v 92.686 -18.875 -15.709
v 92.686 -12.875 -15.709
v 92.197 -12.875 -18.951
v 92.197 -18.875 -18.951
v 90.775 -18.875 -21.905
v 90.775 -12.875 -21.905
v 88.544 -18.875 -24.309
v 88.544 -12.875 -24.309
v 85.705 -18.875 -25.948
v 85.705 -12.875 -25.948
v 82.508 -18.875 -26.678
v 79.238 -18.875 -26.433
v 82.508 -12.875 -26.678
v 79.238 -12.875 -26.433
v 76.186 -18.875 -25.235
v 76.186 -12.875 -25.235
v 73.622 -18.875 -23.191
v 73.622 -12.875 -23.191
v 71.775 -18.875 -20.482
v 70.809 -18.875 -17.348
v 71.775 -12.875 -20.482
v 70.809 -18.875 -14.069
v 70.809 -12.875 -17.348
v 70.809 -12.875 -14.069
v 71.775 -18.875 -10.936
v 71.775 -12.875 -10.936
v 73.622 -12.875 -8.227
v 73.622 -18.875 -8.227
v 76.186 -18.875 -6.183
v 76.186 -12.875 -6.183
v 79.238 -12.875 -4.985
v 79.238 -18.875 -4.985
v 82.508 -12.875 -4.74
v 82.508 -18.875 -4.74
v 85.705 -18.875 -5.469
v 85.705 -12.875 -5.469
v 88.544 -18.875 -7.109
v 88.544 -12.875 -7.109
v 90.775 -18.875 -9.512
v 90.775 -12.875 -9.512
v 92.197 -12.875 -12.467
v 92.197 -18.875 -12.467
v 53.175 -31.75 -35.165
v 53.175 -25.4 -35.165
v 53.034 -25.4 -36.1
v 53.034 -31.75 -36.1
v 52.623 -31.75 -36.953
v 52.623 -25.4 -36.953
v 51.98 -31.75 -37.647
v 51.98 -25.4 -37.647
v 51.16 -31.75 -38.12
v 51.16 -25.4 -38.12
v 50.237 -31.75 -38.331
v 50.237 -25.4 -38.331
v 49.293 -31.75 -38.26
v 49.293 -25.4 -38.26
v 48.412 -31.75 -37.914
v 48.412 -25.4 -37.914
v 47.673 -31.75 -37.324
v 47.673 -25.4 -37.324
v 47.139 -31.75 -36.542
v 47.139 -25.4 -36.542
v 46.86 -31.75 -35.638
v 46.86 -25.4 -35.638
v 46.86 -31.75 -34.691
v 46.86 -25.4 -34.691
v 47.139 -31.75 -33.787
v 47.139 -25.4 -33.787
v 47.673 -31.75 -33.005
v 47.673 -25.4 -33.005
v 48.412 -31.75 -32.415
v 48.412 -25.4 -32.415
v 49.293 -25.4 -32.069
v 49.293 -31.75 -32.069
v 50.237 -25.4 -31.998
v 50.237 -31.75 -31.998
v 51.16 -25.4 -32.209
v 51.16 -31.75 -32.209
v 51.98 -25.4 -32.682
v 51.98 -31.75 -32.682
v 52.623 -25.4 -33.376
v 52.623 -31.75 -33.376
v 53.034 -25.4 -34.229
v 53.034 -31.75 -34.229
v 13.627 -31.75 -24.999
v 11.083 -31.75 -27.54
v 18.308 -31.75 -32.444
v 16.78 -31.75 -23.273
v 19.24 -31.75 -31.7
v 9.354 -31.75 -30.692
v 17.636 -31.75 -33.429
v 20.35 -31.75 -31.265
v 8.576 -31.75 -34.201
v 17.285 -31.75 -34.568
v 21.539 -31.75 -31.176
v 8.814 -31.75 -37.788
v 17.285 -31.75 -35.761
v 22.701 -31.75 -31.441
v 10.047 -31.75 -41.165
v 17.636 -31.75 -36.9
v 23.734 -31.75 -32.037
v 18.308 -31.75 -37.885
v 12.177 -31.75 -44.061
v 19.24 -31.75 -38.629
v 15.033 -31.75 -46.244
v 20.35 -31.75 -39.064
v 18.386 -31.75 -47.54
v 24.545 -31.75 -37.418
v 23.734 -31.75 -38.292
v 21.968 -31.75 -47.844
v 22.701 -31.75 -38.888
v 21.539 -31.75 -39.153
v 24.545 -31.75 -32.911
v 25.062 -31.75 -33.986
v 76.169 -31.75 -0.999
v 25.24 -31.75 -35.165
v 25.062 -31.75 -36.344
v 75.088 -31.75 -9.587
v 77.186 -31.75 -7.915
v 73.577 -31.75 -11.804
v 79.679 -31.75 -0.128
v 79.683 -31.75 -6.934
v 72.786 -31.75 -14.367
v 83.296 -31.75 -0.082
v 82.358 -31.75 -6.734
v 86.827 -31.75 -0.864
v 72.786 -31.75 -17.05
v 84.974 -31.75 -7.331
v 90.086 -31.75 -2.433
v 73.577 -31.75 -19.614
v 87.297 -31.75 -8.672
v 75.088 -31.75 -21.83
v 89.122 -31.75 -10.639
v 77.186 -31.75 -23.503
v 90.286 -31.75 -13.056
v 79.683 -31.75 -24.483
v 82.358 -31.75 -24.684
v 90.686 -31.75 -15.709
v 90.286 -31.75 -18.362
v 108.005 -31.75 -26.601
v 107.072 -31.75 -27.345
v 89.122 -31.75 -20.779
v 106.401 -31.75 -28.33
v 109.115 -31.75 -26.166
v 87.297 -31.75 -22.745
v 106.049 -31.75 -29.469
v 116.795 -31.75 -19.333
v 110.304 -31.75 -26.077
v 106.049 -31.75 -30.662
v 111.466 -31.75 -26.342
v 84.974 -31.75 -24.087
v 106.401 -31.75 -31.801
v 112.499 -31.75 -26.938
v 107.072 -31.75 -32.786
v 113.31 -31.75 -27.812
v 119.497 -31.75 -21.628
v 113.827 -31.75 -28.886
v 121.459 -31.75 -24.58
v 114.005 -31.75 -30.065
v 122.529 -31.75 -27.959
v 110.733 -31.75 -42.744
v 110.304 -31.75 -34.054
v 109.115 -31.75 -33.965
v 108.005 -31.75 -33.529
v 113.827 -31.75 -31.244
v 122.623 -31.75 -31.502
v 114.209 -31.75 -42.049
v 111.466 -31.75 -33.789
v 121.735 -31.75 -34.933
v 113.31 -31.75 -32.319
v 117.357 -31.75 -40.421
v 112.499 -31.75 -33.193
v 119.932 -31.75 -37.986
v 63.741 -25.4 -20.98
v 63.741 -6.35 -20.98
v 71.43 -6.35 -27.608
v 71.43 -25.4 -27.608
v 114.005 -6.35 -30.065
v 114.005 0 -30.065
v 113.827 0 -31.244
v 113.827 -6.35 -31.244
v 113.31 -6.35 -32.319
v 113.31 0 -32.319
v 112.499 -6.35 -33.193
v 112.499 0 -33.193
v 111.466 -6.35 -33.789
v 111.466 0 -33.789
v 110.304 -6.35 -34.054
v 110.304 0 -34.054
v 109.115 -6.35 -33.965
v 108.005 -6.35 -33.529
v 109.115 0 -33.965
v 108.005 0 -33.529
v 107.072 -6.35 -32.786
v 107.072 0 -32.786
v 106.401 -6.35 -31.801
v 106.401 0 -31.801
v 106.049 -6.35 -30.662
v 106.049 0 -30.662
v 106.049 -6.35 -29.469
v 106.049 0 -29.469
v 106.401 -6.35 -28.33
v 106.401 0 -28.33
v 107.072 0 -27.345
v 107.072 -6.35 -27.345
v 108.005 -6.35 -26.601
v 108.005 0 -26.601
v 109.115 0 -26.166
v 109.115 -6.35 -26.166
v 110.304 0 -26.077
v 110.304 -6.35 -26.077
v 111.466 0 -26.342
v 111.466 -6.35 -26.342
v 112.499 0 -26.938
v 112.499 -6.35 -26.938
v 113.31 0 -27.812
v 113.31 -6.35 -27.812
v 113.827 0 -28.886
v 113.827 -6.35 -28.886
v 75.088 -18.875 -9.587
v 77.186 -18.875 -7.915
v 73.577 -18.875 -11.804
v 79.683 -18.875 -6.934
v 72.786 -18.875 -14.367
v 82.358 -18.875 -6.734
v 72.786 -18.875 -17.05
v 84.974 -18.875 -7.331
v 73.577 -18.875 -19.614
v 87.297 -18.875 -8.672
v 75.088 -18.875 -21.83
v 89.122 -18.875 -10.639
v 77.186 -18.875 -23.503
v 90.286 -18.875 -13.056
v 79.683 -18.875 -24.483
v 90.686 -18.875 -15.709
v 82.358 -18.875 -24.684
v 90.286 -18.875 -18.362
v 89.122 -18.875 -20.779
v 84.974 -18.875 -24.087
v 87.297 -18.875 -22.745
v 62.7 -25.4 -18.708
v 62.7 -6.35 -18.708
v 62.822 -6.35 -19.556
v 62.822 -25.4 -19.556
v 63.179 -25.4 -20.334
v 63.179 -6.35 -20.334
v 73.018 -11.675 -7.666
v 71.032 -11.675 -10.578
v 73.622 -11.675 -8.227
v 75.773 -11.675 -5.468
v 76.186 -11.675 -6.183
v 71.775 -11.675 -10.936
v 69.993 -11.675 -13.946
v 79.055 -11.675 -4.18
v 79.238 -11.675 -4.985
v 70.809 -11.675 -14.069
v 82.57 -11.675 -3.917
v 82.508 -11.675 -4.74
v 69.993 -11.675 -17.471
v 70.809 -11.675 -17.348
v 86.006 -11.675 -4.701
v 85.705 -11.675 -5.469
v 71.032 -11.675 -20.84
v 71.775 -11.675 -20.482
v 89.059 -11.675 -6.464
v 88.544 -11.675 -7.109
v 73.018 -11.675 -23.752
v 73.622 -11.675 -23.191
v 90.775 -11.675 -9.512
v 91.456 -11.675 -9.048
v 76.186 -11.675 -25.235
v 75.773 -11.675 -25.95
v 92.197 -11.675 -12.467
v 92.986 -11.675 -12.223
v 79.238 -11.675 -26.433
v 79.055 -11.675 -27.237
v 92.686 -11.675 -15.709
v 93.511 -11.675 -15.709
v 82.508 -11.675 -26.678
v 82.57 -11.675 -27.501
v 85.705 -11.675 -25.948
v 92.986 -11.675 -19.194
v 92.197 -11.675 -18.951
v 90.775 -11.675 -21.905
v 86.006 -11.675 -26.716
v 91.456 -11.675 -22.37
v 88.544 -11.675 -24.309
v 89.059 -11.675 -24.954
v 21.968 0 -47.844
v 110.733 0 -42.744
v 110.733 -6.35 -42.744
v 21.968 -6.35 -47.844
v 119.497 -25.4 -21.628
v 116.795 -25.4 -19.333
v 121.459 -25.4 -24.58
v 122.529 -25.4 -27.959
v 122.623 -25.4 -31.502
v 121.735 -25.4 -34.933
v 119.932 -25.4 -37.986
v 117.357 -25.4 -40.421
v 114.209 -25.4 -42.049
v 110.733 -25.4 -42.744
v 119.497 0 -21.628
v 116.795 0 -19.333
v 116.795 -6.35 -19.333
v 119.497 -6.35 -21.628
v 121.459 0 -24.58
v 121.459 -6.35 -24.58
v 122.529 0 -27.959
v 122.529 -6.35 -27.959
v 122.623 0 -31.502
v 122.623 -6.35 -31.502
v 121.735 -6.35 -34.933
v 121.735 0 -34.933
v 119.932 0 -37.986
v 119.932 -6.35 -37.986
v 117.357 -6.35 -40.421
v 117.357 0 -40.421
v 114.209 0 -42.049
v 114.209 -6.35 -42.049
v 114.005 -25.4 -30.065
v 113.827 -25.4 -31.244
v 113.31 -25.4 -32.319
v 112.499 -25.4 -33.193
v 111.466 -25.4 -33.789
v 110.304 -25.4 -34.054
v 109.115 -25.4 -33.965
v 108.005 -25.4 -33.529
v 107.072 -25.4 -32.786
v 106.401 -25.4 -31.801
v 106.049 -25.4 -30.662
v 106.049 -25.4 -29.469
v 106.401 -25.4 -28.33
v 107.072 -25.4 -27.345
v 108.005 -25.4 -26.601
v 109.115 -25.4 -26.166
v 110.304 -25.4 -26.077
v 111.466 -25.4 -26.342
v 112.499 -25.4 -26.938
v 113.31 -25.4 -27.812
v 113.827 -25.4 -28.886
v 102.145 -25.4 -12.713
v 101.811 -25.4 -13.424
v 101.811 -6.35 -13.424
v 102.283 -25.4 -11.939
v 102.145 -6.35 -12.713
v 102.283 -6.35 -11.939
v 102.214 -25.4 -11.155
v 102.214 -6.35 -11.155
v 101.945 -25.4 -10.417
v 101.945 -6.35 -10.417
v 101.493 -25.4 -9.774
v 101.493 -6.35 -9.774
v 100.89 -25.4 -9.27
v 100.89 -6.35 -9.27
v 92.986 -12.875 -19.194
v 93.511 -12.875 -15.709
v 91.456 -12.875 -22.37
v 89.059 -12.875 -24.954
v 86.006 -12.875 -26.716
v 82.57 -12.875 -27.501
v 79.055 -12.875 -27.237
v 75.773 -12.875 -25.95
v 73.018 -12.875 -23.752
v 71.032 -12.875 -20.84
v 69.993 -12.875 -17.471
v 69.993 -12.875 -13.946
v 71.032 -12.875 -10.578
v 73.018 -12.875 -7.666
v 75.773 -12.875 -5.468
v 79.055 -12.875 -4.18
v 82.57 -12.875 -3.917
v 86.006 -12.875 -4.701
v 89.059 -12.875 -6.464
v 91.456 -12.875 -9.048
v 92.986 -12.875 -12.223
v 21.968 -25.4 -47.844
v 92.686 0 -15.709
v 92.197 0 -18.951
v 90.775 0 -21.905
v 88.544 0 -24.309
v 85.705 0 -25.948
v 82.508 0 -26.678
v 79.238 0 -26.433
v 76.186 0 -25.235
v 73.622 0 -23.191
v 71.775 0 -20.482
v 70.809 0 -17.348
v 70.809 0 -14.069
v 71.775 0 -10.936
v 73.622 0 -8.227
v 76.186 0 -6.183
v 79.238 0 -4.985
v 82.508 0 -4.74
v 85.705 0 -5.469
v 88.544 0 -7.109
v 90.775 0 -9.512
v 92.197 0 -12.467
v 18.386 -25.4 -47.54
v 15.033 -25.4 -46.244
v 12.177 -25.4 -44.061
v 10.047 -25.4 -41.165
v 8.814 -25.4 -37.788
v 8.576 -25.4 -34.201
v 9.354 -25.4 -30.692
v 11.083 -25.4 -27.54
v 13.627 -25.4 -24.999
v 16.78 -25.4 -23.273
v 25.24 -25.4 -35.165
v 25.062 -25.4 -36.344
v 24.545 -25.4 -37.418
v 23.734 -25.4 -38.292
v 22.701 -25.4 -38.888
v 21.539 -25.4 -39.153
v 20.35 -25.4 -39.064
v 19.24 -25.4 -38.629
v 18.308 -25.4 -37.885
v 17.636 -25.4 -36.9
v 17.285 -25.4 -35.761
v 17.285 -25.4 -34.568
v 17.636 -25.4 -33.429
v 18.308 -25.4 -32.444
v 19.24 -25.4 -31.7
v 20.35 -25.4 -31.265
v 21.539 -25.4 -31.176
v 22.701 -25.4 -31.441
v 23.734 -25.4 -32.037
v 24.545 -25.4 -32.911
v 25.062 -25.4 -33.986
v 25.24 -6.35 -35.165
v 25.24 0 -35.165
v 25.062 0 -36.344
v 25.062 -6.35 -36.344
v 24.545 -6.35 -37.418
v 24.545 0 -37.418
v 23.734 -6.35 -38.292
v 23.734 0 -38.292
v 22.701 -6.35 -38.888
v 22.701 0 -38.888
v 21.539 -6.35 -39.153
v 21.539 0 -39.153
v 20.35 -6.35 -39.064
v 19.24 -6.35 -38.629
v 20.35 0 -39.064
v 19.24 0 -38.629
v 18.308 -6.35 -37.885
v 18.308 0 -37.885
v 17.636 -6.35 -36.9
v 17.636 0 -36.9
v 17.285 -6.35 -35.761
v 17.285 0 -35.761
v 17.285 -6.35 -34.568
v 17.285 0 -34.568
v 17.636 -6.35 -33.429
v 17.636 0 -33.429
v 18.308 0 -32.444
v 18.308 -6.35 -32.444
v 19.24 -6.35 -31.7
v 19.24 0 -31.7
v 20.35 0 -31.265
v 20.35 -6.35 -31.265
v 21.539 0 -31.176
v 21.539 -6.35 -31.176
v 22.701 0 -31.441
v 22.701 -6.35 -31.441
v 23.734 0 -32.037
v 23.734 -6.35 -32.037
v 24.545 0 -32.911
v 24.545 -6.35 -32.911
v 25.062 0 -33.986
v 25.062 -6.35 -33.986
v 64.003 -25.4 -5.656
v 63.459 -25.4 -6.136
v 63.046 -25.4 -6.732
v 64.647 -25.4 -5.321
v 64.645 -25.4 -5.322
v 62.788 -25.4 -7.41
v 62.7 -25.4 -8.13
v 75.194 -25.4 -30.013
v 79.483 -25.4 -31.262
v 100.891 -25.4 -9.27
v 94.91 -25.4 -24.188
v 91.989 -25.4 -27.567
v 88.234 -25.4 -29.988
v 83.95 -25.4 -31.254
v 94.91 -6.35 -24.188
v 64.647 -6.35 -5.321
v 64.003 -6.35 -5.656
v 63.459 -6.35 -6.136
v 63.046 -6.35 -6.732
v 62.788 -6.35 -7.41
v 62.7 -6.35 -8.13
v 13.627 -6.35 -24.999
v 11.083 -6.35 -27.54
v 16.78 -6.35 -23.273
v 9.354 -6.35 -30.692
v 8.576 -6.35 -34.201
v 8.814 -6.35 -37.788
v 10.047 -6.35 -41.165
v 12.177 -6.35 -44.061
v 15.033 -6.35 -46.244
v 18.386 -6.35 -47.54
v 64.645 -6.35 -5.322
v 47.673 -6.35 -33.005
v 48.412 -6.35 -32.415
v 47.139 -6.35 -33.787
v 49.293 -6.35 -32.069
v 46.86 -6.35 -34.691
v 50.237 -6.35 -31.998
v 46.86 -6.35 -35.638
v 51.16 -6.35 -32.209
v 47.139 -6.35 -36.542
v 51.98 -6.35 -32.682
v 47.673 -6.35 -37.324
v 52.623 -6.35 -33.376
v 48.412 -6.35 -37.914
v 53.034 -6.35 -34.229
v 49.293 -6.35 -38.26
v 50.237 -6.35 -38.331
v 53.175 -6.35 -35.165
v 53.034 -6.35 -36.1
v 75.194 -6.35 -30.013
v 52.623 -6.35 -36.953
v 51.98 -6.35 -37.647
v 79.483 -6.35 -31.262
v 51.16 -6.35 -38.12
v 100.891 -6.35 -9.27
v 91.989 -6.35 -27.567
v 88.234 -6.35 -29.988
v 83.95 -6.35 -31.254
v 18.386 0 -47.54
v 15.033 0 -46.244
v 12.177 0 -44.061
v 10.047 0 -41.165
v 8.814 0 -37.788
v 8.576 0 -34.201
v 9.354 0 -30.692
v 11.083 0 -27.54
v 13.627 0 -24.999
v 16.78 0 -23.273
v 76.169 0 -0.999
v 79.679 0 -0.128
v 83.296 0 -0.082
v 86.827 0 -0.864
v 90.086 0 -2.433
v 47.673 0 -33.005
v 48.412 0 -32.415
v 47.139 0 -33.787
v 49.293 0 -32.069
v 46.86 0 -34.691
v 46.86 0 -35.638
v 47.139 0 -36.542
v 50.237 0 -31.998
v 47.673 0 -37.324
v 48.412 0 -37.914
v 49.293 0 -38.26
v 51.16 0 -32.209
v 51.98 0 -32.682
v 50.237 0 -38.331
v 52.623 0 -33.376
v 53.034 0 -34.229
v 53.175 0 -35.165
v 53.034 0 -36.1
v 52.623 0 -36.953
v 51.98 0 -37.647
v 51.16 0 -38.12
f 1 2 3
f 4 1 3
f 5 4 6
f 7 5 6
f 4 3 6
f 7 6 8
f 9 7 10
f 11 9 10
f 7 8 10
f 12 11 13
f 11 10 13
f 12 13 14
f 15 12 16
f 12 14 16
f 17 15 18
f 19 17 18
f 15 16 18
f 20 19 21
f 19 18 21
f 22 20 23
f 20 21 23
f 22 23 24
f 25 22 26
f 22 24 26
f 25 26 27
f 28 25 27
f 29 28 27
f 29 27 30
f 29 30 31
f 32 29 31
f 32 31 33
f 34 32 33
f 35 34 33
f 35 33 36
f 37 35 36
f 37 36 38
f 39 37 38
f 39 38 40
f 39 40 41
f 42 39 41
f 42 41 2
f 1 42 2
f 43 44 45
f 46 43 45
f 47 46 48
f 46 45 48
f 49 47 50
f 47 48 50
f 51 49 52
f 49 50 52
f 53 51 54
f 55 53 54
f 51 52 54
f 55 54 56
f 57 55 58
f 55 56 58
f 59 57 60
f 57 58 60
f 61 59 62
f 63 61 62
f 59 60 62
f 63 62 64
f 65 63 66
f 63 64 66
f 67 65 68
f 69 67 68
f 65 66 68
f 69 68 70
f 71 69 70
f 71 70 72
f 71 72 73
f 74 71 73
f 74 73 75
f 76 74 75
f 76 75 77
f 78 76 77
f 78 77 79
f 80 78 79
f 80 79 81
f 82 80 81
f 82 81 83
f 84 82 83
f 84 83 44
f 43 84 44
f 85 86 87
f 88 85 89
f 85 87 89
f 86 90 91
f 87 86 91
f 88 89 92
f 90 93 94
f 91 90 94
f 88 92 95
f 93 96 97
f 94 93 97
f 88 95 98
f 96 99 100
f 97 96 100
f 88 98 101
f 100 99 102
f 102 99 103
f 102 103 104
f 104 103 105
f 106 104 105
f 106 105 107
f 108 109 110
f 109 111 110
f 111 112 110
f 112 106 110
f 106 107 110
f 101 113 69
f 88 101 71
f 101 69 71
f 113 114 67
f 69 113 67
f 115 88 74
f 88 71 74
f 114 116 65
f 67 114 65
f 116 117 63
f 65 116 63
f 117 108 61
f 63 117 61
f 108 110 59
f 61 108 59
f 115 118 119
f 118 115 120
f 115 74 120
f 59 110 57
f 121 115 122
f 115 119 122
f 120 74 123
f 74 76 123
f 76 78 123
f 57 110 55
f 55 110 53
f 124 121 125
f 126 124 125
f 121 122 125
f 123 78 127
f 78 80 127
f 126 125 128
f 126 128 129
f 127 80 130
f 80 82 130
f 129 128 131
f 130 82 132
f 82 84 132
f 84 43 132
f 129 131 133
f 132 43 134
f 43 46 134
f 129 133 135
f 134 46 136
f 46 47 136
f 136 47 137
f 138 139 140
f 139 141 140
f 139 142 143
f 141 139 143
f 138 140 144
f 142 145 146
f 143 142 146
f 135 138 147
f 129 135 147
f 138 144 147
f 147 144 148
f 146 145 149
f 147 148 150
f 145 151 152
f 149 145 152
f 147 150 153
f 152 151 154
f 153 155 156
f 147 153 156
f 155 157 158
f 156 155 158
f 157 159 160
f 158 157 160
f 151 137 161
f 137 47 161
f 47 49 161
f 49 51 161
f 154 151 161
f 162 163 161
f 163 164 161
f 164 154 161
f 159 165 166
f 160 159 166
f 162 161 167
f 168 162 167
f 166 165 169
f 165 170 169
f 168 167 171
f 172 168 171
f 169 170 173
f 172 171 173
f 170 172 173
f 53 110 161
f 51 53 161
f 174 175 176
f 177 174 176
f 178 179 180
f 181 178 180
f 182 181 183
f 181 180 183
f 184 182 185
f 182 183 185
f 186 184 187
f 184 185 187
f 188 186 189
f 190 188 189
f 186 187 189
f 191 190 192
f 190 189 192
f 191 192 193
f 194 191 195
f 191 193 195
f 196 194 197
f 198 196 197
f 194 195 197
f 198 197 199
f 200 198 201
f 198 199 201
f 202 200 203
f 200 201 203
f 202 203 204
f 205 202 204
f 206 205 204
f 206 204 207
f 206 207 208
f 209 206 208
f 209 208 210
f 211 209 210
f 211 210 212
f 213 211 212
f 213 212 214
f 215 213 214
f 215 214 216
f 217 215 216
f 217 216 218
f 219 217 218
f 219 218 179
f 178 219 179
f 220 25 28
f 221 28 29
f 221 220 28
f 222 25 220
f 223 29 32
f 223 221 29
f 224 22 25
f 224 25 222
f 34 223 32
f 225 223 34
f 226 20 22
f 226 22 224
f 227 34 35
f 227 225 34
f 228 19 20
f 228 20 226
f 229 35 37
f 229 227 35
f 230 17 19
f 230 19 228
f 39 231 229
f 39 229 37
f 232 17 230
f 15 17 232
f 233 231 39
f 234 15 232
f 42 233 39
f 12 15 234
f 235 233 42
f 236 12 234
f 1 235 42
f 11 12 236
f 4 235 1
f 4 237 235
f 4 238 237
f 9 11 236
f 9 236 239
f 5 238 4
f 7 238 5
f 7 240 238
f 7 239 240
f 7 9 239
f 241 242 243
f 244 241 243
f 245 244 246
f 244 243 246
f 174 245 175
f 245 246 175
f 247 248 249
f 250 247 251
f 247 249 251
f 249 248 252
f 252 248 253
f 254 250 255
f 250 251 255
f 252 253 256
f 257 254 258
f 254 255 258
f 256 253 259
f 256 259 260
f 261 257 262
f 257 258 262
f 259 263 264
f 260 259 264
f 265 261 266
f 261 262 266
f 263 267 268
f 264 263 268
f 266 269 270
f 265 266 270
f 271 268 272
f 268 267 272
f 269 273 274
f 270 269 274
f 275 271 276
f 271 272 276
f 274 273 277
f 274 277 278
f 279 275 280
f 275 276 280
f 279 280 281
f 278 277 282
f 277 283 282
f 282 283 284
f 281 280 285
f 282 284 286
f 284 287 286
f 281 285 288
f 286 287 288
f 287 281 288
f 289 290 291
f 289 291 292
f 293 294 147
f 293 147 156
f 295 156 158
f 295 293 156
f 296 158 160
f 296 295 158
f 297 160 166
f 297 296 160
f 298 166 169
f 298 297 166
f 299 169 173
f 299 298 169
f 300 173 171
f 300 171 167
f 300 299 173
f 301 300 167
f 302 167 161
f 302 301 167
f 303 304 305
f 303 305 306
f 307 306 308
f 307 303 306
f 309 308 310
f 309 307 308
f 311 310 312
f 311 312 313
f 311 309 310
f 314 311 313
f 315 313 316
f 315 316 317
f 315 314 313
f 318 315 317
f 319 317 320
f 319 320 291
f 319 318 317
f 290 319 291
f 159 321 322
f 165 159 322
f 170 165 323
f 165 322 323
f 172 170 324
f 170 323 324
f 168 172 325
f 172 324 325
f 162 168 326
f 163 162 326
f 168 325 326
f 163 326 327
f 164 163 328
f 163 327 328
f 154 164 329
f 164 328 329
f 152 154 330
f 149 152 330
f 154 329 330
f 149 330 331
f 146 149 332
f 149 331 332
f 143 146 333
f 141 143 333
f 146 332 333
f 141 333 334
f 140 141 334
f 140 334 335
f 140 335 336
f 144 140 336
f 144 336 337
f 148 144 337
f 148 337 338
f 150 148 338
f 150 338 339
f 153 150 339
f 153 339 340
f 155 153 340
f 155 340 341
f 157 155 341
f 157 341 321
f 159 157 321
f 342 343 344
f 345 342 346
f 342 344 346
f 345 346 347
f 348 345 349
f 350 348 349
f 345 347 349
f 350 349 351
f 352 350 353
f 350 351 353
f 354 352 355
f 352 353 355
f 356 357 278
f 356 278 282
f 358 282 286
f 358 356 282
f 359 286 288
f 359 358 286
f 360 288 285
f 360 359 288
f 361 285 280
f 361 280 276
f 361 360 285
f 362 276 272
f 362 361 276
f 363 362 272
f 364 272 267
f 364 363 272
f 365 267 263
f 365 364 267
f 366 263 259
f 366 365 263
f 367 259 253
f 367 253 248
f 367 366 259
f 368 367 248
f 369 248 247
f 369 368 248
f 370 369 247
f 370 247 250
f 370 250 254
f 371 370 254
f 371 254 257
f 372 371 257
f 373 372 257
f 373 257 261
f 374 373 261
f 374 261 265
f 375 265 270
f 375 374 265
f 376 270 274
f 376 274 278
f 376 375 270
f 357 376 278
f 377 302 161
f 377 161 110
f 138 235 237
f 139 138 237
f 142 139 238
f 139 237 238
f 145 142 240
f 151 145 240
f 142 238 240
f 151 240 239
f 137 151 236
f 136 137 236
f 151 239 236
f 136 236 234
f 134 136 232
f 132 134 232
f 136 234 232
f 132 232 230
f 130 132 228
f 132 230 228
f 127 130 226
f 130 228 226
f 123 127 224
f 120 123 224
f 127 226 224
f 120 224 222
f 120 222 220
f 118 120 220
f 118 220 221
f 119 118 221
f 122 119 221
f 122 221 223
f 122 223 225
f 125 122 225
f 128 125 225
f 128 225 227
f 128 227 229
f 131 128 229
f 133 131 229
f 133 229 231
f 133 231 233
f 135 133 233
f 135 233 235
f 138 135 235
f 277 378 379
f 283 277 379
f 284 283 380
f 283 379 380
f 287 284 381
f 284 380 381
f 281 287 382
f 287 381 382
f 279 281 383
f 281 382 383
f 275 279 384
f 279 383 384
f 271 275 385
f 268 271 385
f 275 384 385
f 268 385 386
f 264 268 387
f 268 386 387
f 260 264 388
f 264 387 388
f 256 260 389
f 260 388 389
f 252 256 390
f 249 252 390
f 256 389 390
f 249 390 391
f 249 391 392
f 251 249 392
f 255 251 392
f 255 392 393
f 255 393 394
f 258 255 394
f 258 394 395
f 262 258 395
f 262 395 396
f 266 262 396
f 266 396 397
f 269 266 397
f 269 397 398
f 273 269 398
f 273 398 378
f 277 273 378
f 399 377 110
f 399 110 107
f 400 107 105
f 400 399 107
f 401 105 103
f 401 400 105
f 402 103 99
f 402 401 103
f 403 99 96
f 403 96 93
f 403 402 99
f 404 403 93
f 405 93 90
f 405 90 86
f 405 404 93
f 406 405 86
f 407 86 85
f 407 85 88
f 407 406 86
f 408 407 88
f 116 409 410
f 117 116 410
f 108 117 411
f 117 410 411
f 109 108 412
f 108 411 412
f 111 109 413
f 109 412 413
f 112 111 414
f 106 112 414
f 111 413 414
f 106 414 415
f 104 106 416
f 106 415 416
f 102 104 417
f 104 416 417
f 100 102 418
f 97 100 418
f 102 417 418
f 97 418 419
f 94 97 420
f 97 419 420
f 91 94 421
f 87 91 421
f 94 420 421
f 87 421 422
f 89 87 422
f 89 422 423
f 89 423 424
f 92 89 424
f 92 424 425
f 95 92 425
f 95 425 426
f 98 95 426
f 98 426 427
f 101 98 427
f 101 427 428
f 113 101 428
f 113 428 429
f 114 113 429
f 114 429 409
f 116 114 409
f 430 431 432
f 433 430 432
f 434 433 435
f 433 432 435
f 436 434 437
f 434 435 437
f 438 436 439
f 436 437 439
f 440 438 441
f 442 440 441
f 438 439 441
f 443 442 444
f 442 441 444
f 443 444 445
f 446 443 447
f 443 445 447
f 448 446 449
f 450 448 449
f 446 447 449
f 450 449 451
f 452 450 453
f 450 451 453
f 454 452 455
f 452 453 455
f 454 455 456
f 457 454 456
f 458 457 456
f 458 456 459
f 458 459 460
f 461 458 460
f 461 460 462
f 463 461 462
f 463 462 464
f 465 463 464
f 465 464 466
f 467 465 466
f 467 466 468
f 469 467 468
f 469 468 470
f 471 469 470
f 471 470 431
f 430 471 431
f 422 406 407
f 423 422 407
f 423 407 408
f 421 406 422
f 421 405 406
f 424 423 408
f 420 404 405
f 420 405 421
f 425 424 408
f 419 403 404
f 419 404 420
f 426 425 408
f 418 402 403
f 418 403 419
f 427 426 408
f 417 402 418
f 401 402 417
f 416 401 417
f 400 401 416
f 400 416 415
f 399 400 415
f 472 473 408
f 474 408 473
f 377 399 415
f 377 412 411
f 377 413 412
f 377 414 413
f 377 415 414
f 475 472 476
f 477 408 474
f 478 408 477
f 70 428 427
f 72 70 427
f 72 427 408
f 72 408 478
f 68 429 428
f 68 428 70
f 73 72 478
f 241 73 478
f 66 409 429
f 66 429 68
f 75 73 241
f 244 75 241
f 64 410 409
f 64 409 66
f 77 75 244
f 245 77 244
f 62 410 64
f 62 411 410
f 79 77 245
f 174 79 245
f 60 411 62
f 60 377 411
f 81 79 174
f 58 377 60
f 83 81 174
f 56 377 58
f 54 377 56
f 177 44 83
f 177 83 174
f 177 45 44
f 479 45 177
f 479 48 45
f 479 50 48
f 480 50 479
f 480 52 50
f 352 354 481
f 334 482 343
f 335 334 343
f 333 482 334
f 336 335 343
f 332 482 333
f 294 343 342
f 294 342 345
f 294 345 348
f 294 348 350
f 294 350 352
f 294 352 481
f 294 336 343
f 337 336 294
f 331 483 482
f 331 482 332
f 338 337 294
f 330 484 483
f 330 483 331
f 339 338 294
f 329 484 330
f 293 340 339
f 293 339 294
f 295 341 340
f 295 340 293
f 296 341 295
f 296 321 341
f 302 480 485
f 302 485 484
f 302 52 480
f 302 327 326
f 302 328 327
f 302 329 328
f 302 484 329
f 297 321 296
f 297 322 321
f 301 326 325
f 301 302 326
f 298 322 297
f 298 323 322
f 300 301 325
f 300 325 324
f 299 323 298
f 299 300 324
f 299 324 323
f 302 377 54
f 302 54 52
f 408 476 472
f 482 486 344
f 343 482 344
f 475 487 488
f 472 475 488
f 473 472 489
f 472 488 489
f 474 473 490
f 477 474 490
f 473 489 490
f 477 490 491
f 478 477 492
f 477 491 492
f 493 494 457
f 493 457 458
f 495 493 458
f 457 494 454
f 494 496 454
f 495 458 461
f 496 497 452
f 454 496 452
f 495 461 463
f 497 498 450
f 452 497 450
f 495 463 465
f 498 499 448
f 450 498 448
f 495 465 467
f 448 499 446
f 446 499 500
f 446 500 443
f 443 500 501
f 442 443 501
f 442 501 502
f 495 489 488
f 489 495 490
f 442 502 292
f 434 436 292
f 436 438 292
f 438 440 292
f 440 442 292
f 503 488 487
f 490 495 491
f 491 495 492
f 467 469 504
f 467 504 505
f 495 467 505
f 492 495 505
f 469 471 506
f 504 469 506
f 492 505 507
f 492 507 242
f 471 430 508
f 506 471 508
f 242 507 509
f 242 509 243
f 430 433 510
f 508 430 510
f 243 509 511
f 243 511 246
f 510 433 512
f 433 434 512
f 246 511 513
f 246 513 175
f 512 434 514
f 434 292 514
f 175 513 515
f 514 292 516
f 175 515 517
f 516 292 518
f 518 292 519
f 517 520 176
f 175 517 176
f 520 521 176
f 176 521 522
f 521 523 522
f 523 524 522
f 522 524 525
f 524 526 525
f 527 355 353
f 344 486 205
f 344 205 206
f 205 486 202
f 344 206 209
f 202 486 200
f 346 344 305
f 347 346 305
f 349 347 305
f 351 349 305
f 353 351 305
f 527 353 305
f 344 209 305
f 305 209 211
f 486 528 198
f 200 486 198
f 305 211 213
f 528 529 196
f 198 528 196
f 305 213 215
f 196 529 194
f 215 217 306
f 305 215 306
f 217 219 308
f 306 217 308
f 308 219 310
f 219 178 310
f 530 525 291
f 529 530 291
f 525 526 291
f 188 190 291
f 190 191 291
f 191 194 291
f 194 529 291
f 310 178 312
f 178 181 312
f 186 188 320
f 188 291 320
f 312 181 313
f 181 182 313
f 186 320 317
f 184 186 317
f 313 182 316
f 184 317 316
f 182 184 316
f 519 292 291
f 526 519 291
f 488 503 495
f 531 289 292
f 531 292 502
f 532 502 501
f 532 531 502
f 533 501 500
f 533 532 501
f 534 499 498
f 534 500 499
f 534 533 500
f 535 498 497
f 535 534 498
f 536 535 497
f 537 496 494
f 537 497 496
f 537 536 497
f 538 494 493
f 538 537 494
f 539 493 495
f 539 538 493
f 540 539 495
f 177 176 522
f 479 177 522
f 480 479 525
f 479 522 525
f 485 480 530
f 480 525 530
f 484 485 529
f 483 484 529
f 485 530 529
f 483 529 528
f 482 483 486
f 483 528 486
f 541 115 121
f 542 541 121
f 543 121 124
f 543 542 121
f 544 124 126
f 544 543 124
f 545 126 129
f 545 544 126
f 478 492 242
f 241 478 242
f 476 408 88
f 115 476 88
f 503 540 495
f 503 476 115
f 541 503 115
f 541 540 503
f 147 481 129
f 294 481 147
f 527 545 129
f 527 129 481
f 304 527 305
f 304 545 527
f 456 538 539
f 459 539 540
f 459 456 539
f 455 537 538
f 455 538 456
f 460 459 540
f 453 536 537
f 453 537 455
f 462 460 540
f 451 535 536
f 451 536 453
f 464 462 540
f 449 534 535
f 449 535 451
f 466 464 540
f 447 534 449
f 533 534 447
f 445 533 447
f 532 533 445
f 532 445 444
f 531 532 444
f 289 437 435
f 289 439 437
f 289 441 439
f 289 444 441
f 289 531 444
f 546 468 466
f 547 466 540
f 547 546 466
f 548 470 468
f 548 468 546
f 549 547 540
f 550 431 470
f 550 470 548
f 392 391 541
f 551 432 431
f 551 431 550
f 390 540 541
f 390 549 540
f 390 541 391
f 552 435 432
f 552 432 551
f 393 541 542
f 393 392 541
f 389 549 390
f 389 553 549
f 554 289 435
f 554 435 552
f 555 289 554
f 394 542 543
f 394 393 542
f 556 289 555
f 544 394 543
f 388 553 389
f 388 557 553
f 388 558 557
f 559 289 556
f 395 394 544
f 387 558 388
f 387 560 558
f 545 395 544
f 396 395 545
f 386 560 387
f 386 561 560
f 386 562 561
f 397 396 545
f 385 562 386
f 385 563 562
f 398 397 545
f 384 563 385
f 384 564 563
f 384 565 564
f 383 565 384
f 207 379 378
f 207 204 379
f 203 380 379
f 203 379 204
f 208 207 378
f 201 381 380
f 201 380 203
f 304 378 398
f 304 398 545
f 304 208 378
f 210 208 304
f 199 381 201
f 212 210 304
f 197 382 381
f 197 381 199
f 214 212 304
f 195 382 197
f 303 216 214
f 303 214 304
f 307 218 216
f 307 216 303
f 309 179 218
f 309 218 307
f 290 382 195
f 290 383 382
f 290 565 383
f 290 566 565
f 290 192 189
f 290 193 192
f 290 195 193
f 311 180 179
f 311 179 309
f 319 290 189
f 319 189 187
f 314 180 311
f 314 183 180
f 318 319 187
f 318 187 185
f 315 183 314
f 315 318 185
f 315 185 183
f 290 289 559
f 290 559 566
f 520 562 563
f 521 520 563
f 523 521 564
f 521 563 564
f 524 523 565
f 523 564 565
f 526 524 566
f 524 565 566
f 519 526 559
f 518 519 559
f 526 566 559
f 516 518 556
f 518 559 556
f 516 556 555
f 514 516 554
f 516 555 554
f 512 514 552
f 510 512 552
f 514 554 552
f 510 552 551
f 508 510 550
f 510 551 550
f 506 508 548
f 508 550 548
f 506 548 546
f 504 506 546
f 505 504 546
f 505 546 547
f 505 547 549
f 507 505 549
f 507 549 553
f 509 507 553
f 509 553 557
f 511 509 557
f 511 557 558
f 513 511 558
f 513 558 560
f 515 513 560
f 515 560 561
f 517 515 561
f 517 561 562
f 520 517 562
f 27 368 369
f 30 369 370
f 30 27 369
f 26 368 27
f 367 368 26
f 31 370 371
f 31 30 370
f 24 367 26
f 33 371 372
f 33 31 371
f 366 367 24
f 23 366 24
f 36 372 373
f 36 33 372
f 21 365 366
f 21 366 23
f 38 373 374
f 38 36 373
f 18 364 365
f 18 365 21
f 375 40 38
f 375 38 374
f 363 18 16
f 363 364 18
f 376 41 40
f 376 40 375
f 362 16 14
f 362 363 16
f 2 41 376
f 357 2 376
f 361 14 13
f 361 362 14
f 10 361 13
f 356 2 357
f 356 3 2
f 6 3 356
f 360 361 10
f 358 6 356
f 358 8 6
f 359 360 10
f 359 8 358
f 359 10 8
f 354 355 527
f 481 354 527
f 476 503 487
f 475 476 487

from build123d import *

# Parameters (mm, degrees)
SKETCH2_R           = 9
SKETCH2_R_2         = 4
SKETCH2_R_3         = 3.175
BOSS_EXTRUDE1_DEPTH = 31.75
CUT_EXTRUDE7_DEPTH  = 19.05
SKETCH4_R           = 11
CUT_EXTRUDE8_DEPTH  = 18.875
SKETCH5_R           = 11.825
CUT_EXTRUDE9_DEPTH  = 1.2


with BuildPart() as part:
    # Sketch2 → Boss-Extrude1 (new body)
    with BuildSketch(Plane(origin=(0, 0, 0), x_dir=(1, 0, 0), z_dir=(0, 1, 0))):
        with BuildLine():
            Line((16.780050899, 23.273406552), (76.169078327, 0.999356152))
            ThreePointArc((76.169078327, 0.999356152), (83.295947219, 0.081549283), (90.085976392, 2.43317287))
            Line((90.085976392, 2.43317287), (116.795312979, 19.333283493))
            ThreePointArc((116.795312979, 19.333283493), (122.299175659, 33.248981014), (110.733053142, 42.744451083))
            Line((110.733053142, 42.744451083), (21.968243349, 47.843674862))
            ThreePointArc((21.968243349, 47.843674862), (8.8138749, 37.788419678), (16.780050899, 23.273406552))
        make_face()
        with Locations((81.685914874, 15.708829783)):
            Circle(SKETCH2_R, mode=Mode.SUBTRACT)
        with Locations((110.004683999, 30.065354964)):
            Circle(SKETCH2_R_2, mode=Mode.SUBTRACT)
        with Locations((21.239874206, 35.164578743)):
            Circle(SKETCH2_R_2, mode=Mode.SUBTRACT)
        with Locations((50, 35.164578743)):
            Circle(SKETCH2_R_3, mode=Mode.SUBTRACT)
    extrude(amount=-BOSS_EXTRUDE1_DEPTH)

    # Sketch3 → Cut-Extrude7 (cut)
    with BuildSketch(Plane(origin=(0, -6.35, 0), x_dir=(1, 0, 0), z_dir=(0, 1, 0))):
        with BuildLine():
            Line((94.910034212, 24.187626921), (101.811056049, 13.424315235))
            ThreePointArc((101.811056049, 13.424315235), (102.214392091, 11.155436631), (100.889566337, 9.269879207))
            Line((100.889566337, 9.269879207), (124.896489339, 9.269879207))
            Line((124.896489339, 9.269879207), (123.850468237, 47.864578743))
            Line((123.850468237, 47.864578743), (8.539874206, 47.864578743))
            Line((8.539874206, 47.864578743), (8.539874206, 20.980420685))
            Line((8.539874206, 20.980420685), (64.646726928, 5.321032632))
            ThreePointArc((64.646726928, 5.321032632), (63.234252728, 6.421229435), (62.7, 8.130056632))
            Line((62.7, 8.130056632), (62.7, 18.708063959))
            ThreePointArc((62.7, 18.708063959), (62.972728913, 19.95786091), (63.741328279, 20.980420685))
            Line((63.741328279, 20.980420685), (71.429767985, 27.607518121))
            ThreePointArc((71.429767985, 27.607518121), (83.950010515, 31.253642555), (94.910034212, 24.187626921))
        make_face()
    extrude(amount=-CUT_EXTRUDE7_DEPTH, mode=Mode.SUBTRACT)

    # Sketch4 → Cut-Extrude8 (cut)
    with BuildSketch(Plane(origin=(0, 0, 0), x_dir=(1, 0, 0), z_dir=(0, 1, 0))):
        with Locations((81.685914874, 15.708829783)):
            Circle(SKETCH4_R)
    extrude(amount=-CUT_EXTRUDE8_DEPTH, mode=Mode.SUBTRACT)

    # Sketch5 → Cut-Extrude9 (cut)
    with BuildSketch(Plane(origin=(0, -12.875, 0), x_dir=(1, 0, 0), z_dir=(0, 1, 0))):
        with Locations((81.685914874, 15.708829783)):
            Circle(SKETCH5_R)
    extrude(amount=CUT_EXTRUDE9_DEPTH, mode=Mode.SUBTRACT)


solid = part.part
